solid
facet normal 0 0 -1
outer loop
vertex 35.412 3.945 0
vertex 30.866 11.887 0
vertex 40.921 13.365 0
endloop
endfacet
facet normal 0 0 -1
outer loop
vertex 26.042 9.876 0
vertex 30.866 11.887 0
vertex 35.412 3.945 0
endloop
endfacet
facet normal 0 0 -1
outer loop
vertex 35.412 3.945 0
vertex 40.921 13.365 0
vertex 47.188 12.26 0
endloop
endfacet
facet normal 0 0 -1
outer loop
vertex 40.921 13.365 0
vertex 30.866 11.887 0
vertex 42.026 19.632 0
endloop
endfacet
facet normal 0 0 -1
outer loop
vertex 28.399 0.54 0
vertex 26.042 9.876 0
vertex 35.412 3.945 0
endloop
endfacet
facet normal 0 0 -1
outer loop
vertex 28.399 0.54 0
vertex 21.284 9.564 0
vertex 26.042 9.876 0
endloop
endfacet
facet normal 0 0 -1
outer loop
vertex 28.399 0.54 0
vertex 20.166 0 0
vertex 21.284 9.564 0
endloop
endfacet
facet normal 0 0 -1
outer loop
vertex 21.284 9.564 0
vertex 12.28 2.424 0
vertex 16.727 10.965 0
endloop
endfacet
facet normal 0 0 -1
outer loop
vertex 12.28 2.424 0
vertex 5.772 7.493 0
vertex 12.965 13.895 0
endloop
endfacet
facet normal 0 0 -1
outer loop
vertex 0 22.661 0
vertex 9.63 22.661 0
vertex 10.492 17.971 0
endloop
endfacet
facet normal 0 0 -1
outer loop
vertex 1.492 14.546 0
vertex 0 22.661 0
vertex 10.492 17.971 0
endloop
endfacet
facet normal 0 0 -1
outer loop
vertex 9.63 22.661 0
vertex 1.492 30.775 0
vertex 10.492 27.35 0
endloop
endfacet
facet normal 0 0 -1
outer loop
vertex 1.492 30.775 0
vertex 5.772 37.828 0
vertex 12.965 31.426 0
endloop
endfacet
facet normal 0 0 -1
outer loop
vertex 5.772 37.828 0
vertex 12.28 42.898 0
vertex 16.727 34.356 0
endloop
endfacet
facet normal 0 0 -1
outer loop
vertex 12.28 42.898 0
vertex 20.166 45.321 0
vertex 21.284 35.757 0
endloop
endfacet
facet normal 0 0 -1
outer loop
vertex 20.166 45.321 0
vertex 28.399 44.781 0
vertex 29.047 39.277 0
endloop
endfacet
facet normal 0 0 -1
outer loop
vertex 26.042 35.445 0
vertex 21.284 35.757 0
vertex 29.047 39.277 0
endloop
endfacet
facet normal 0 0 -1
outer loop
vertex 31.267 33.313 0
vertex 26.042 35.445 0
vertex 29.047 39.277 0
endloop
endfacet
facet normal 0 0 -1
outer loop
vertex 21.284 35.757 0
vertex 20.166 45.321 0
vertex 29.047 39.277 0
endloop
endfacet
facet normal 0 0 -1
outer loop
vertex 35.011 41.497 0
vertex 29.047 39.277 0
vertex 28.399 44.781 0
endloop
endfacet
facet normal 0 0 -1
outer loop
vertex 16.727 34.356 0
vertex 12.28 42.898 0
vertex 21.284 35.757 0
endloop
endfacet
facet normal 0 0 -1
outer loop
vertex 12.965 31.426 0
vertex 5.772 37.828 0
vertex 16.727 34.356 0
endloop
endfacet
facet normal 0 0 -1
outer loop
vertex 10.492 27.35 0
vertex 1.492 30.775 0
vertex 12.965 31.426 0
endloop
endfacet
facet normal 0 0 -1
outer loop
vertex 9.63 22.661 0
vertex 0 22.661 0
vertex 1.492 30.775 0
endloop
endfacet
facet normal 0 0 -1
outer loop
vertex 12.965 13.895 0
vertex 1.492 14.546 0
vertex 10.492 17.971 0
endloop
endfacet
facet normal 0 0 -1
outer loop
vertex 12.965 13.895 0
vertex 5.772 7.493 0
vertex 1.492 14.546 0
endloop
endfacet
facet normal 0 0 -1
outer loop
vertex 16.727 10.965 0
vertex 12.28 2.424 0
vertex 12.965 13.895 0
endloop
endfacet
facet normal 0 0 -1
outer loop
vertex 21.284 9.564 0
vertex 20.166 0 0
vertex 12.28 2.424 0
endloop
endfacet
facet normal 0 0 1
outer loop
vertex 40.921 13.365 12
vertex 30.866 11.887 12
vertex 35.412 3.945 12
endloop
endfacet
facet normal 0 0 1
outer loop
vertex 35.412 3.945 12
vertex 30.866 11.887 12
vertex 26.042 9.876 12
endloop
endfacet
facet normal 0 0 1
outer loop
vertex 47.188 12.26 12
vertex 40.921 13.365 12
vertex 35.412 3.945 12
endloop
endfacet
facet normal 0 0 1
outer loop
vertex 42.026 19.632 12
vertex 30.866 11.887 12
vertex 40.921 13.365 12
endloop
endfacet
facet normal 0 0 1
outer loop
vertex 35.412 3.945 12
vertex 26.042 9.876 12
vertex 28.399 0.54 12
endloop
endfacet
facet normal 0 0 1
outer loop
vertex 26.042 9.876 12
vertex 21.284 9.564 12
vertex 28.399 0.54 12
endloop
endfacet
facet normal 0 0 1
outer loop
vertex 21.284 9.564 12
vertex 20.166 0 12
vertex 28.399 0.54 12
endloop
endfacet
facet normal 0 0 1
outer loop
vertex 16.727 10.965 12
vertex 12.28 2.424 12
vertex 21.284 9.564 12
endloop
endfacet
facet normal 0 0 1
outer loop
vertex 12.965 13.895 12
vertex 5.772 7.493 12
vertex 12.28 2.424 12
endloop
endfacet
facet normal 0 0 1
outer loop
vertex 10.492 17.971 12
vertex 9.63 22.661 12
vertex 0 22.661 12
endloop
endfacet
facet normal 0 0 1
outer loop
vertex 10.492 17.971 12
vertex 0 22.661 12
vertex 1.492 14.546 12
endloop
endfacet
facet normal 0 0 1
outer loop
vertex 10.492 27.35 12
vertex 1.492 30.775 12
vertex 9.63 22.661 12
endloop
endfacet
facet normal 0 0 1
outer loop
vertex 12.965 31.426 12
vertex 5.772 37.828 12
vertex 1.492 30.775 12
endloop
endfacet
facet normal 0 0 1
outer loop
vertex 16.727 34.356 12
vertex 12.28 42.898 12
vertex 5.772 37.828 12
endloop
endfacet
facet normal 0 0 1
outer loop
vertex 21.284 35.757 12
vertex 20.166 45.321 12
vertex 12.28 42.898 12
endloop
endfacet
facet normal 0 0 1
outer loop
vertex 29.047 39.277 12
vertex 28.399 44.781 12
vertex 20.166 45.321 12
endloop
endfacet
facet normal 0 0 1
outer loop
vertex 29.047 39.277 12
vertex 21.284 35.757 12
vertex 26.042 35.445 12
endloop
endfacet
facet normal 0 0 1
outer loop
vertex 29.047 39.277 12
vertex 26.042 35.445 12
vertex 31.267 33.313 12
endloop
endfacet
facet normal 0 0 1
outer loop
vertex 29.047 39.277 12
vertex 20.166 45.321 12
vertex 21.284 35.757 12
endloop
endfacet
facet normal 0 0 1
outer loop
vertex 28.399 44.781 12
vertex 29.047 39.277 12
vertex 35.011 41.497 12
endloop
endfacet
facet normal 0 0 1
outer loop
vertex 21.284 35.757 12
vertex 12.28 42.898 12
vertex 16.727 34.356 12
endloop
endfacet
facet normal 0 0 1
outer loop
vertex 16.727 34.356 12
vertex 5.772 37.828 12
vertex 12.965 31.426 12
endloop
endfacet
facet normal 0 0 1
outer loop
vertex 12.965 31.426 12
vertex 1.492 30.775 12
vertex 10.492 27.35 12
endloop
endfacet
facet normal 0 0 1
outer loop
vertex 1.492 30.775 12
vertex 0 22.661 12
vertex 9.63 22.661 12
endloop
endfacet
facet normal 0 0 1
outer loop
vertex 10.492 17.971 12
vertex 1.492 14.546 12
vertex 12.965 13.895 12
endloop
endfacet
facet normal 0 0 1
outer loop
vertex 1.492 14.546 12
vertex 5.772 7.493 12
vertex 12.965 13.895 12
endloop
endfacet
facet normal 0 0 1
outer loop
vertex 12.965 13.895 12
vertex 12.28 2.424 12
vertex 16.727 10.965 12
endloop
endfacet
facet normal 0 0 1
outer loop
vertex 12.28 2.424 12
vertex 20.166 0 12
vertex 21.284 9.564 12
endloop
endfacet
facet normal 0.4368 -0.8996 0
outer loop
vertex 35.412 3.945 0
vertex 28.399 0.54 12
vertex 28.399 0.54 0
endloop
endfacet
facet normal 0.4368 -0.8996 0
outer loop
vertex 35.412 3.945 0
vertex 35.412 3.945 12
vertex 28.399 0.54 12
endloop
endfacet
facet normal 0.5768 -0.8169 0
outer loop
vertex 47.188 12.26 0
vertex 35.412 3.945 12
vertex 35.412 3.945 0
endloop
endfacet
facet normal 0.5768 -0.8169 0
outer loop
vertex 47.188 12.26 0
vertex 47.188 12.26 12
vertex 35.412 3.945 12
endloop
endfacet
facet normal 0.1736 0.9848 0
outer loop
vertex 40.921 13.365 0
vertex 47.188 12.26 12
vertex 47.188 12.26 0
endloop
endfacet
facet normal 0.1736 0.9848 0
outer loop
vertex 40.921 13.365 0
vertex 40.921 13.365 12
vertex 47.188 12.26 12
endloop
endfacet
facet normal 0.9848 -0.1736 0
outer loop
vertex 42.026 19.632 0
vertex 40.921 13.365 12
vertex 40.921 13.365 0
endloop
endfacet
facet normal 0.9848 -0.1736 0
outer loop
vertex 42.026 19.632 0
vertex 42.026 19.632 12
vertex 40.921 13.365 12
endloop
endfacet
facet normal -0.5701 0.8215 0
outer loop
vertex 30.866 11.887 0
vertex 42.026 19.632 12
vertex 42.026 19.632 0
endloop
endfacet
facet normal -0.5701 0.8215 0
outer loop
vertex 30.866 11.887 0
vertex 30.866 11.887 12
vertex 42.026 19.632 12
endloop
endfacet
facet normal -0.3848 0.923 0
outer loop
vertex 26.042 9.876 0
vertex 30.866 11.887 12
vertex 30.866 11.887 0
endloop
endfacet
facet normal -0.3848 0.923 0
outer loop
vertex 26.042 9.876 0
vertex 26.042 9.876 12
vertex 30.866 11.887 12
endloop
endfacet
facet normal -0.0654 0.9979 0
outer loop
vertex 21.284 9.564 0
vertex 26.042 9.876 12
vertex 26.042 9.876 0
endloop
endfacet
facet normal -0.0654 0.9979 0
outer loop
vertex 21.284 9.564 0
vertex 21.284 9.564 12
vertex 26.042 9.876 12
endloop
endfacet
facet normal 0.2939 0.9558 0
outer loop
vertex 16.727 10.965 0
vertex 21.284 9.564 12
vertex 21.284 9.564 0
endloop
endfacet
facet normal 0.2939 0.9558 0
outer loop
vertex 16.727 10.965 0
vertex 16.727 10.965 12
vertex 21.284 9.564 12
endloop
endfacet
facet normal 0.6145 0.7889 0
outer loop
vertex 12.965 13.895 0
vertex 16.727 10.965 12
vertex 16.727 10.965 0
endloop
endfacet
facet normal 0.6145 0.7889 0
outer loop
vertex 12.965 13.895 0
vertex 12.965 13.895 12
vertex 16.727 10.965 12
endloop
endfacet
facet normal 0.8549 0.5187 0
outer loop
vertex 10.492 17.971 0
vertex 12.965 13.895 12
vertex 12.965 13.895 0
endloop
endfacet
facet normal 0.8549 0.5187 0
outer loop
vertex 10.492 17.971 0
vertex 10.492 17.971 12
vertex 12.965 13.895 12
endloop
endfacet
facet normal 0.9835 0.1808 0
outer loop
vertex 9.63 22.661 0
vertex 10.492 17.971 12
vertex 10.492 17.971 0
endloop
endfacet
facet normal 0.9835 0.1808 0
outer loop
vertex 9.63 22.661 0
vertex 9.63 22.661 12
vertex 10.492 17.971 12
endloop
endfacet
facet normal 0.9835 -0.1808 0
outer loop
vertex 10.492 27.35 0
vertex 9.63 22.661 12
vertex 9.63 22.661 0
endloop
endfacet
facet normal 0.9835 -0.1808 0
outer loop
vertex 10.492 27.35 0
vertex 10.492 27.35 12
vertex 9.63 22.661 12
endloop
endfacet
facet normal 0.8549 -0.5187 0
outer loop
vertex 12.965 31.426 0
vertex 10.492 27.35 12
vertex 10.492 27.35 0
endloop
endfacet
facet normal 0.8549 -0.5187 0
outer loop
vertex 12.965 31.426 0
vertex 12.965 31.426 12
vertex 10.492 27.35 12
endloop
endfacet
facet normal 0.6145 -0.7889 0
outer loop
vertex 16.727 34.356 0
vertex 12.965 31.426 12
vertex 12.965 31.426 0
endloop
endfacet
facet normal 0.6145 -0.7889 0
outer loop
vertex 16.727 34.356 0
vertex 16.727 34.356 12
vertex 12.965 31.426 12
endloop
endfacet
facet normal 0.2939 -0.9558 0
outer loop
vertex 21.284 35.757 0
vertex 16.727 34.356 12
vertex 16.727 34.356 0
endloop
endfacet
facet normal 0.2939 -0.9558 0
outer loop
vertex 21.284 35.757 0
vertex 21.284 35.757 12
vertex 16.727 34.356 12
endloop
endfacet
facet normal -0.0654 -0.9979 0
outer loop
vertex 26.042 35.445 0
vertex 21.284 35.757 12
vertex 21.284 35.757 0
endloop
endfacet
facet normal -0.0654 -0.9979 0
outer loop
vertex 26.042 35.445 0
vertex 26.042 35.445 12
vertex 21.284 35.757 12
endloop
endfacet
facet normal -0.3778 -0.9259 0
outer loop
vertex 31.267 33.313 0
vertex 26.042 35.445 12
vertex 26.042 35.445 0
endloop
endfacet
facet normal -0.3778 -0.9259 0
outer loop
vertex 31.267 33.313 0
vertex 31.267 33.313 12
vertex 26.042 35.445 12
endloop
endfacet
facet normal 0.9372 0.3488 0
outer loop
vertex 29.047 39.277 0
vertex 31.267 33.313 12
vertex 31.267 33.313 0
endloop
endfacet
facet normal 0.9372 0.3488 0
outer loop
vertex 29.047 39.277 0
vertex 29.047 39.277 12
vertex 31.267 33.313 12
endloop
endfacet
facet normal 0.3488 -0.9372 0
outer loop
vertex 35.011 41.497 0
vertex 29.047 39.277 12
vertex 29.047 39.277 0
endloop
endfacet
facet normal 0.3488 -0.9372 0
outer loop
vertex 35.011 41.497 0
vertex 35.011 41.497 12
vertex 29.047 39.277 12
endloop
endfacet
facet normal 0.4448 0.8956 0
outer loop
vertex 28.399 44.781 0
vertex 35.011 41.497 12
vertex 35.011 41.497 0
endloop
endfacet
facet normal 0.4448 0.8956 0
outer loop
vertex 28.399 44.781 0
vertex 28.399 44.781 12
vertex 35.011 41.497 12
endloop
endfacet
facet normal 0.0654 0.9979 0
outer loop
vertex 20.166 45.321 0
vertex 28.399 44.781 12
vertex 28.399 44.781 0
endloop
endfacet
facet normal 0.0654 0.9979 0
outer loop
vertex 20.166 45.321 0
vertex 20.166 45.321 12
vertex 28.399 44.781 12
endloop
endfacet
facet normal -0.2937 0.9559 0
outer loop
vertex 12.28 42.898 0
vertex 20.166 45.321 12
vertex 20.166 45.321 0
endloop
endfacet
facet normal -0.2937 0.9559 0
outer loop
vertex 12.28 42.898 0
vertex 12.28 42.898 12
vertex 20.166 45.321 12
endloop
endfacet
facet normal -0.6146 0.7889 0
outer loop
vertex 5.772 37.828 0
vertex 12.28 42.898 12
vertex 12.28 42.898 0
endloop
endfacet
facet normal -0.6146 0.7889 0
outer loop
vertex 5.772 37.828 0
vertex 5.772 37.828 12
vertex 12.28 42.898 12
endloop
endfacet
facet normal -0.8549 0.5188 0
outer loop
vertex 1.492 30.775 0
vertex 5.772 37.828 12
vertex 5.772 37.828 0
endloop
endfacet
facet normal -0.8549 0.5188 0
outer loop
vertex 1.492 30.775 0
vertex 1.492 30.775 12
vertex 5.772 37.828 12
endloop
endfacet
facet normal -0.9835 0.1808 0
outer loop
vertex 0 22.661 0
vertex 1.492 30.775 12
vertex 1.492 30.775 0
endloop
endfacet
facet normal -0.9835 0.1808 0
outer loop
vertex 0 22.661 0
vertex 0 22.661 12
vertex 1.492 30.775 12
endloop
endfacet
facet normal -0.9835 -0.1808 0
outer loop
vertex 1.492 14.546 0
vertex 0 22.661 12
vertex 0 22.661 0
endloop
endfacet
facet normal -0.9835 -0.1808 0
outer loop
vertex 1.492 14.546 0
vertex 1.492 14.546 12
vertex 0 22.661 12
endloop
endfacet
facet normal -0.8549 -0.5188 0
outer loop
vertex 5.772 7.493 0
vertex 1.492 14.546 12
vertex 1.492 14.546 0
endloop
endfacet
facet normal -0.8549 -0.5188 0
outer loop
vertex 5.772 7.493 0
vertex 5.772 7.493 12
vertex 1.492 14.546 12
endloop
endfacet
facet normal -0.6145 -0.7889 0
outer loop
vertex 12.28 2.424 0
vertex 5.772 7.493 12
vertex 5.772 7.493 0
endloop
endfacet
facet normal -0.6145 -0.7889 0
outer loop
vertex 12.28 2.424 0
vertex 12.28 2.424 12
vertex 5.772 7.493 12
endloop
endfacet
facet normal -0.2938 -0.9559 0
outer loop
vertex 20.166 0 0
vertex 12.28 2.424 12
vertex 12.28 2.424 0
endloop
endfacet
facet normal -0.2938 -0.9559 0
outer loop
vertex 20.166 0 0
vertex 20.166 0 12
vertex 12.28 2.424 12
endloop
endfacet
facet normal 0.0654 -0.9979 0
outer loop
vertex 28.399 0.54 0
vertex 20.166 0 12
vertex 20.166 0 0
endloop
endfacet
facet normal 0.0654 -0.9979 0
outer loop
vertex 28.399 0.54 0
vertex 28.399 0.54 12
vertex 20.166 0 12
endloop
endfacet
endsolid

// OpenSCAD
$fn = 32;

// ----------------------------------------------------------------------
// Eye lug: ring_tail, 12 mm thick
// ----------------------------------------------------------------------

// --- parameters (mm) ---
profile_height = 12;      // extrusion height
profile_points = 30;      // points of the closed outline

profile = [[29.047, 39.277], [35.011, 41.497], [28.399, 44.781], [20.166, 45.321], [12.28, 42.898], [5.772, 37.828], [1.492, 30.775], [0, 22.661], [1.492, 14.546], [5.772, 7.493], [12.28, 2.424], [20.166, 0], [28.399, 0.54], [35.412, 3.945], [47.188, 12.26], [40.921, 13.365], [42.026, 19.632], [30.866, 11.887], [26.042, 9.876], [21.284, 9.564], [16.727, 10.965], [12.965, 13.895], [10.492, 17.971], [9.63, 22.661], [10.492, 27.35], [12.965, 31.426], [16.727, 34.356], [21.284, 35.757], [26.042, 35.445], [31.267, 33.313]];  // single closed polygon, 30 points, counter clockwise

// --- the one profile operation ---
linear_extrude(height = profile_height) polygon(points = profile);
